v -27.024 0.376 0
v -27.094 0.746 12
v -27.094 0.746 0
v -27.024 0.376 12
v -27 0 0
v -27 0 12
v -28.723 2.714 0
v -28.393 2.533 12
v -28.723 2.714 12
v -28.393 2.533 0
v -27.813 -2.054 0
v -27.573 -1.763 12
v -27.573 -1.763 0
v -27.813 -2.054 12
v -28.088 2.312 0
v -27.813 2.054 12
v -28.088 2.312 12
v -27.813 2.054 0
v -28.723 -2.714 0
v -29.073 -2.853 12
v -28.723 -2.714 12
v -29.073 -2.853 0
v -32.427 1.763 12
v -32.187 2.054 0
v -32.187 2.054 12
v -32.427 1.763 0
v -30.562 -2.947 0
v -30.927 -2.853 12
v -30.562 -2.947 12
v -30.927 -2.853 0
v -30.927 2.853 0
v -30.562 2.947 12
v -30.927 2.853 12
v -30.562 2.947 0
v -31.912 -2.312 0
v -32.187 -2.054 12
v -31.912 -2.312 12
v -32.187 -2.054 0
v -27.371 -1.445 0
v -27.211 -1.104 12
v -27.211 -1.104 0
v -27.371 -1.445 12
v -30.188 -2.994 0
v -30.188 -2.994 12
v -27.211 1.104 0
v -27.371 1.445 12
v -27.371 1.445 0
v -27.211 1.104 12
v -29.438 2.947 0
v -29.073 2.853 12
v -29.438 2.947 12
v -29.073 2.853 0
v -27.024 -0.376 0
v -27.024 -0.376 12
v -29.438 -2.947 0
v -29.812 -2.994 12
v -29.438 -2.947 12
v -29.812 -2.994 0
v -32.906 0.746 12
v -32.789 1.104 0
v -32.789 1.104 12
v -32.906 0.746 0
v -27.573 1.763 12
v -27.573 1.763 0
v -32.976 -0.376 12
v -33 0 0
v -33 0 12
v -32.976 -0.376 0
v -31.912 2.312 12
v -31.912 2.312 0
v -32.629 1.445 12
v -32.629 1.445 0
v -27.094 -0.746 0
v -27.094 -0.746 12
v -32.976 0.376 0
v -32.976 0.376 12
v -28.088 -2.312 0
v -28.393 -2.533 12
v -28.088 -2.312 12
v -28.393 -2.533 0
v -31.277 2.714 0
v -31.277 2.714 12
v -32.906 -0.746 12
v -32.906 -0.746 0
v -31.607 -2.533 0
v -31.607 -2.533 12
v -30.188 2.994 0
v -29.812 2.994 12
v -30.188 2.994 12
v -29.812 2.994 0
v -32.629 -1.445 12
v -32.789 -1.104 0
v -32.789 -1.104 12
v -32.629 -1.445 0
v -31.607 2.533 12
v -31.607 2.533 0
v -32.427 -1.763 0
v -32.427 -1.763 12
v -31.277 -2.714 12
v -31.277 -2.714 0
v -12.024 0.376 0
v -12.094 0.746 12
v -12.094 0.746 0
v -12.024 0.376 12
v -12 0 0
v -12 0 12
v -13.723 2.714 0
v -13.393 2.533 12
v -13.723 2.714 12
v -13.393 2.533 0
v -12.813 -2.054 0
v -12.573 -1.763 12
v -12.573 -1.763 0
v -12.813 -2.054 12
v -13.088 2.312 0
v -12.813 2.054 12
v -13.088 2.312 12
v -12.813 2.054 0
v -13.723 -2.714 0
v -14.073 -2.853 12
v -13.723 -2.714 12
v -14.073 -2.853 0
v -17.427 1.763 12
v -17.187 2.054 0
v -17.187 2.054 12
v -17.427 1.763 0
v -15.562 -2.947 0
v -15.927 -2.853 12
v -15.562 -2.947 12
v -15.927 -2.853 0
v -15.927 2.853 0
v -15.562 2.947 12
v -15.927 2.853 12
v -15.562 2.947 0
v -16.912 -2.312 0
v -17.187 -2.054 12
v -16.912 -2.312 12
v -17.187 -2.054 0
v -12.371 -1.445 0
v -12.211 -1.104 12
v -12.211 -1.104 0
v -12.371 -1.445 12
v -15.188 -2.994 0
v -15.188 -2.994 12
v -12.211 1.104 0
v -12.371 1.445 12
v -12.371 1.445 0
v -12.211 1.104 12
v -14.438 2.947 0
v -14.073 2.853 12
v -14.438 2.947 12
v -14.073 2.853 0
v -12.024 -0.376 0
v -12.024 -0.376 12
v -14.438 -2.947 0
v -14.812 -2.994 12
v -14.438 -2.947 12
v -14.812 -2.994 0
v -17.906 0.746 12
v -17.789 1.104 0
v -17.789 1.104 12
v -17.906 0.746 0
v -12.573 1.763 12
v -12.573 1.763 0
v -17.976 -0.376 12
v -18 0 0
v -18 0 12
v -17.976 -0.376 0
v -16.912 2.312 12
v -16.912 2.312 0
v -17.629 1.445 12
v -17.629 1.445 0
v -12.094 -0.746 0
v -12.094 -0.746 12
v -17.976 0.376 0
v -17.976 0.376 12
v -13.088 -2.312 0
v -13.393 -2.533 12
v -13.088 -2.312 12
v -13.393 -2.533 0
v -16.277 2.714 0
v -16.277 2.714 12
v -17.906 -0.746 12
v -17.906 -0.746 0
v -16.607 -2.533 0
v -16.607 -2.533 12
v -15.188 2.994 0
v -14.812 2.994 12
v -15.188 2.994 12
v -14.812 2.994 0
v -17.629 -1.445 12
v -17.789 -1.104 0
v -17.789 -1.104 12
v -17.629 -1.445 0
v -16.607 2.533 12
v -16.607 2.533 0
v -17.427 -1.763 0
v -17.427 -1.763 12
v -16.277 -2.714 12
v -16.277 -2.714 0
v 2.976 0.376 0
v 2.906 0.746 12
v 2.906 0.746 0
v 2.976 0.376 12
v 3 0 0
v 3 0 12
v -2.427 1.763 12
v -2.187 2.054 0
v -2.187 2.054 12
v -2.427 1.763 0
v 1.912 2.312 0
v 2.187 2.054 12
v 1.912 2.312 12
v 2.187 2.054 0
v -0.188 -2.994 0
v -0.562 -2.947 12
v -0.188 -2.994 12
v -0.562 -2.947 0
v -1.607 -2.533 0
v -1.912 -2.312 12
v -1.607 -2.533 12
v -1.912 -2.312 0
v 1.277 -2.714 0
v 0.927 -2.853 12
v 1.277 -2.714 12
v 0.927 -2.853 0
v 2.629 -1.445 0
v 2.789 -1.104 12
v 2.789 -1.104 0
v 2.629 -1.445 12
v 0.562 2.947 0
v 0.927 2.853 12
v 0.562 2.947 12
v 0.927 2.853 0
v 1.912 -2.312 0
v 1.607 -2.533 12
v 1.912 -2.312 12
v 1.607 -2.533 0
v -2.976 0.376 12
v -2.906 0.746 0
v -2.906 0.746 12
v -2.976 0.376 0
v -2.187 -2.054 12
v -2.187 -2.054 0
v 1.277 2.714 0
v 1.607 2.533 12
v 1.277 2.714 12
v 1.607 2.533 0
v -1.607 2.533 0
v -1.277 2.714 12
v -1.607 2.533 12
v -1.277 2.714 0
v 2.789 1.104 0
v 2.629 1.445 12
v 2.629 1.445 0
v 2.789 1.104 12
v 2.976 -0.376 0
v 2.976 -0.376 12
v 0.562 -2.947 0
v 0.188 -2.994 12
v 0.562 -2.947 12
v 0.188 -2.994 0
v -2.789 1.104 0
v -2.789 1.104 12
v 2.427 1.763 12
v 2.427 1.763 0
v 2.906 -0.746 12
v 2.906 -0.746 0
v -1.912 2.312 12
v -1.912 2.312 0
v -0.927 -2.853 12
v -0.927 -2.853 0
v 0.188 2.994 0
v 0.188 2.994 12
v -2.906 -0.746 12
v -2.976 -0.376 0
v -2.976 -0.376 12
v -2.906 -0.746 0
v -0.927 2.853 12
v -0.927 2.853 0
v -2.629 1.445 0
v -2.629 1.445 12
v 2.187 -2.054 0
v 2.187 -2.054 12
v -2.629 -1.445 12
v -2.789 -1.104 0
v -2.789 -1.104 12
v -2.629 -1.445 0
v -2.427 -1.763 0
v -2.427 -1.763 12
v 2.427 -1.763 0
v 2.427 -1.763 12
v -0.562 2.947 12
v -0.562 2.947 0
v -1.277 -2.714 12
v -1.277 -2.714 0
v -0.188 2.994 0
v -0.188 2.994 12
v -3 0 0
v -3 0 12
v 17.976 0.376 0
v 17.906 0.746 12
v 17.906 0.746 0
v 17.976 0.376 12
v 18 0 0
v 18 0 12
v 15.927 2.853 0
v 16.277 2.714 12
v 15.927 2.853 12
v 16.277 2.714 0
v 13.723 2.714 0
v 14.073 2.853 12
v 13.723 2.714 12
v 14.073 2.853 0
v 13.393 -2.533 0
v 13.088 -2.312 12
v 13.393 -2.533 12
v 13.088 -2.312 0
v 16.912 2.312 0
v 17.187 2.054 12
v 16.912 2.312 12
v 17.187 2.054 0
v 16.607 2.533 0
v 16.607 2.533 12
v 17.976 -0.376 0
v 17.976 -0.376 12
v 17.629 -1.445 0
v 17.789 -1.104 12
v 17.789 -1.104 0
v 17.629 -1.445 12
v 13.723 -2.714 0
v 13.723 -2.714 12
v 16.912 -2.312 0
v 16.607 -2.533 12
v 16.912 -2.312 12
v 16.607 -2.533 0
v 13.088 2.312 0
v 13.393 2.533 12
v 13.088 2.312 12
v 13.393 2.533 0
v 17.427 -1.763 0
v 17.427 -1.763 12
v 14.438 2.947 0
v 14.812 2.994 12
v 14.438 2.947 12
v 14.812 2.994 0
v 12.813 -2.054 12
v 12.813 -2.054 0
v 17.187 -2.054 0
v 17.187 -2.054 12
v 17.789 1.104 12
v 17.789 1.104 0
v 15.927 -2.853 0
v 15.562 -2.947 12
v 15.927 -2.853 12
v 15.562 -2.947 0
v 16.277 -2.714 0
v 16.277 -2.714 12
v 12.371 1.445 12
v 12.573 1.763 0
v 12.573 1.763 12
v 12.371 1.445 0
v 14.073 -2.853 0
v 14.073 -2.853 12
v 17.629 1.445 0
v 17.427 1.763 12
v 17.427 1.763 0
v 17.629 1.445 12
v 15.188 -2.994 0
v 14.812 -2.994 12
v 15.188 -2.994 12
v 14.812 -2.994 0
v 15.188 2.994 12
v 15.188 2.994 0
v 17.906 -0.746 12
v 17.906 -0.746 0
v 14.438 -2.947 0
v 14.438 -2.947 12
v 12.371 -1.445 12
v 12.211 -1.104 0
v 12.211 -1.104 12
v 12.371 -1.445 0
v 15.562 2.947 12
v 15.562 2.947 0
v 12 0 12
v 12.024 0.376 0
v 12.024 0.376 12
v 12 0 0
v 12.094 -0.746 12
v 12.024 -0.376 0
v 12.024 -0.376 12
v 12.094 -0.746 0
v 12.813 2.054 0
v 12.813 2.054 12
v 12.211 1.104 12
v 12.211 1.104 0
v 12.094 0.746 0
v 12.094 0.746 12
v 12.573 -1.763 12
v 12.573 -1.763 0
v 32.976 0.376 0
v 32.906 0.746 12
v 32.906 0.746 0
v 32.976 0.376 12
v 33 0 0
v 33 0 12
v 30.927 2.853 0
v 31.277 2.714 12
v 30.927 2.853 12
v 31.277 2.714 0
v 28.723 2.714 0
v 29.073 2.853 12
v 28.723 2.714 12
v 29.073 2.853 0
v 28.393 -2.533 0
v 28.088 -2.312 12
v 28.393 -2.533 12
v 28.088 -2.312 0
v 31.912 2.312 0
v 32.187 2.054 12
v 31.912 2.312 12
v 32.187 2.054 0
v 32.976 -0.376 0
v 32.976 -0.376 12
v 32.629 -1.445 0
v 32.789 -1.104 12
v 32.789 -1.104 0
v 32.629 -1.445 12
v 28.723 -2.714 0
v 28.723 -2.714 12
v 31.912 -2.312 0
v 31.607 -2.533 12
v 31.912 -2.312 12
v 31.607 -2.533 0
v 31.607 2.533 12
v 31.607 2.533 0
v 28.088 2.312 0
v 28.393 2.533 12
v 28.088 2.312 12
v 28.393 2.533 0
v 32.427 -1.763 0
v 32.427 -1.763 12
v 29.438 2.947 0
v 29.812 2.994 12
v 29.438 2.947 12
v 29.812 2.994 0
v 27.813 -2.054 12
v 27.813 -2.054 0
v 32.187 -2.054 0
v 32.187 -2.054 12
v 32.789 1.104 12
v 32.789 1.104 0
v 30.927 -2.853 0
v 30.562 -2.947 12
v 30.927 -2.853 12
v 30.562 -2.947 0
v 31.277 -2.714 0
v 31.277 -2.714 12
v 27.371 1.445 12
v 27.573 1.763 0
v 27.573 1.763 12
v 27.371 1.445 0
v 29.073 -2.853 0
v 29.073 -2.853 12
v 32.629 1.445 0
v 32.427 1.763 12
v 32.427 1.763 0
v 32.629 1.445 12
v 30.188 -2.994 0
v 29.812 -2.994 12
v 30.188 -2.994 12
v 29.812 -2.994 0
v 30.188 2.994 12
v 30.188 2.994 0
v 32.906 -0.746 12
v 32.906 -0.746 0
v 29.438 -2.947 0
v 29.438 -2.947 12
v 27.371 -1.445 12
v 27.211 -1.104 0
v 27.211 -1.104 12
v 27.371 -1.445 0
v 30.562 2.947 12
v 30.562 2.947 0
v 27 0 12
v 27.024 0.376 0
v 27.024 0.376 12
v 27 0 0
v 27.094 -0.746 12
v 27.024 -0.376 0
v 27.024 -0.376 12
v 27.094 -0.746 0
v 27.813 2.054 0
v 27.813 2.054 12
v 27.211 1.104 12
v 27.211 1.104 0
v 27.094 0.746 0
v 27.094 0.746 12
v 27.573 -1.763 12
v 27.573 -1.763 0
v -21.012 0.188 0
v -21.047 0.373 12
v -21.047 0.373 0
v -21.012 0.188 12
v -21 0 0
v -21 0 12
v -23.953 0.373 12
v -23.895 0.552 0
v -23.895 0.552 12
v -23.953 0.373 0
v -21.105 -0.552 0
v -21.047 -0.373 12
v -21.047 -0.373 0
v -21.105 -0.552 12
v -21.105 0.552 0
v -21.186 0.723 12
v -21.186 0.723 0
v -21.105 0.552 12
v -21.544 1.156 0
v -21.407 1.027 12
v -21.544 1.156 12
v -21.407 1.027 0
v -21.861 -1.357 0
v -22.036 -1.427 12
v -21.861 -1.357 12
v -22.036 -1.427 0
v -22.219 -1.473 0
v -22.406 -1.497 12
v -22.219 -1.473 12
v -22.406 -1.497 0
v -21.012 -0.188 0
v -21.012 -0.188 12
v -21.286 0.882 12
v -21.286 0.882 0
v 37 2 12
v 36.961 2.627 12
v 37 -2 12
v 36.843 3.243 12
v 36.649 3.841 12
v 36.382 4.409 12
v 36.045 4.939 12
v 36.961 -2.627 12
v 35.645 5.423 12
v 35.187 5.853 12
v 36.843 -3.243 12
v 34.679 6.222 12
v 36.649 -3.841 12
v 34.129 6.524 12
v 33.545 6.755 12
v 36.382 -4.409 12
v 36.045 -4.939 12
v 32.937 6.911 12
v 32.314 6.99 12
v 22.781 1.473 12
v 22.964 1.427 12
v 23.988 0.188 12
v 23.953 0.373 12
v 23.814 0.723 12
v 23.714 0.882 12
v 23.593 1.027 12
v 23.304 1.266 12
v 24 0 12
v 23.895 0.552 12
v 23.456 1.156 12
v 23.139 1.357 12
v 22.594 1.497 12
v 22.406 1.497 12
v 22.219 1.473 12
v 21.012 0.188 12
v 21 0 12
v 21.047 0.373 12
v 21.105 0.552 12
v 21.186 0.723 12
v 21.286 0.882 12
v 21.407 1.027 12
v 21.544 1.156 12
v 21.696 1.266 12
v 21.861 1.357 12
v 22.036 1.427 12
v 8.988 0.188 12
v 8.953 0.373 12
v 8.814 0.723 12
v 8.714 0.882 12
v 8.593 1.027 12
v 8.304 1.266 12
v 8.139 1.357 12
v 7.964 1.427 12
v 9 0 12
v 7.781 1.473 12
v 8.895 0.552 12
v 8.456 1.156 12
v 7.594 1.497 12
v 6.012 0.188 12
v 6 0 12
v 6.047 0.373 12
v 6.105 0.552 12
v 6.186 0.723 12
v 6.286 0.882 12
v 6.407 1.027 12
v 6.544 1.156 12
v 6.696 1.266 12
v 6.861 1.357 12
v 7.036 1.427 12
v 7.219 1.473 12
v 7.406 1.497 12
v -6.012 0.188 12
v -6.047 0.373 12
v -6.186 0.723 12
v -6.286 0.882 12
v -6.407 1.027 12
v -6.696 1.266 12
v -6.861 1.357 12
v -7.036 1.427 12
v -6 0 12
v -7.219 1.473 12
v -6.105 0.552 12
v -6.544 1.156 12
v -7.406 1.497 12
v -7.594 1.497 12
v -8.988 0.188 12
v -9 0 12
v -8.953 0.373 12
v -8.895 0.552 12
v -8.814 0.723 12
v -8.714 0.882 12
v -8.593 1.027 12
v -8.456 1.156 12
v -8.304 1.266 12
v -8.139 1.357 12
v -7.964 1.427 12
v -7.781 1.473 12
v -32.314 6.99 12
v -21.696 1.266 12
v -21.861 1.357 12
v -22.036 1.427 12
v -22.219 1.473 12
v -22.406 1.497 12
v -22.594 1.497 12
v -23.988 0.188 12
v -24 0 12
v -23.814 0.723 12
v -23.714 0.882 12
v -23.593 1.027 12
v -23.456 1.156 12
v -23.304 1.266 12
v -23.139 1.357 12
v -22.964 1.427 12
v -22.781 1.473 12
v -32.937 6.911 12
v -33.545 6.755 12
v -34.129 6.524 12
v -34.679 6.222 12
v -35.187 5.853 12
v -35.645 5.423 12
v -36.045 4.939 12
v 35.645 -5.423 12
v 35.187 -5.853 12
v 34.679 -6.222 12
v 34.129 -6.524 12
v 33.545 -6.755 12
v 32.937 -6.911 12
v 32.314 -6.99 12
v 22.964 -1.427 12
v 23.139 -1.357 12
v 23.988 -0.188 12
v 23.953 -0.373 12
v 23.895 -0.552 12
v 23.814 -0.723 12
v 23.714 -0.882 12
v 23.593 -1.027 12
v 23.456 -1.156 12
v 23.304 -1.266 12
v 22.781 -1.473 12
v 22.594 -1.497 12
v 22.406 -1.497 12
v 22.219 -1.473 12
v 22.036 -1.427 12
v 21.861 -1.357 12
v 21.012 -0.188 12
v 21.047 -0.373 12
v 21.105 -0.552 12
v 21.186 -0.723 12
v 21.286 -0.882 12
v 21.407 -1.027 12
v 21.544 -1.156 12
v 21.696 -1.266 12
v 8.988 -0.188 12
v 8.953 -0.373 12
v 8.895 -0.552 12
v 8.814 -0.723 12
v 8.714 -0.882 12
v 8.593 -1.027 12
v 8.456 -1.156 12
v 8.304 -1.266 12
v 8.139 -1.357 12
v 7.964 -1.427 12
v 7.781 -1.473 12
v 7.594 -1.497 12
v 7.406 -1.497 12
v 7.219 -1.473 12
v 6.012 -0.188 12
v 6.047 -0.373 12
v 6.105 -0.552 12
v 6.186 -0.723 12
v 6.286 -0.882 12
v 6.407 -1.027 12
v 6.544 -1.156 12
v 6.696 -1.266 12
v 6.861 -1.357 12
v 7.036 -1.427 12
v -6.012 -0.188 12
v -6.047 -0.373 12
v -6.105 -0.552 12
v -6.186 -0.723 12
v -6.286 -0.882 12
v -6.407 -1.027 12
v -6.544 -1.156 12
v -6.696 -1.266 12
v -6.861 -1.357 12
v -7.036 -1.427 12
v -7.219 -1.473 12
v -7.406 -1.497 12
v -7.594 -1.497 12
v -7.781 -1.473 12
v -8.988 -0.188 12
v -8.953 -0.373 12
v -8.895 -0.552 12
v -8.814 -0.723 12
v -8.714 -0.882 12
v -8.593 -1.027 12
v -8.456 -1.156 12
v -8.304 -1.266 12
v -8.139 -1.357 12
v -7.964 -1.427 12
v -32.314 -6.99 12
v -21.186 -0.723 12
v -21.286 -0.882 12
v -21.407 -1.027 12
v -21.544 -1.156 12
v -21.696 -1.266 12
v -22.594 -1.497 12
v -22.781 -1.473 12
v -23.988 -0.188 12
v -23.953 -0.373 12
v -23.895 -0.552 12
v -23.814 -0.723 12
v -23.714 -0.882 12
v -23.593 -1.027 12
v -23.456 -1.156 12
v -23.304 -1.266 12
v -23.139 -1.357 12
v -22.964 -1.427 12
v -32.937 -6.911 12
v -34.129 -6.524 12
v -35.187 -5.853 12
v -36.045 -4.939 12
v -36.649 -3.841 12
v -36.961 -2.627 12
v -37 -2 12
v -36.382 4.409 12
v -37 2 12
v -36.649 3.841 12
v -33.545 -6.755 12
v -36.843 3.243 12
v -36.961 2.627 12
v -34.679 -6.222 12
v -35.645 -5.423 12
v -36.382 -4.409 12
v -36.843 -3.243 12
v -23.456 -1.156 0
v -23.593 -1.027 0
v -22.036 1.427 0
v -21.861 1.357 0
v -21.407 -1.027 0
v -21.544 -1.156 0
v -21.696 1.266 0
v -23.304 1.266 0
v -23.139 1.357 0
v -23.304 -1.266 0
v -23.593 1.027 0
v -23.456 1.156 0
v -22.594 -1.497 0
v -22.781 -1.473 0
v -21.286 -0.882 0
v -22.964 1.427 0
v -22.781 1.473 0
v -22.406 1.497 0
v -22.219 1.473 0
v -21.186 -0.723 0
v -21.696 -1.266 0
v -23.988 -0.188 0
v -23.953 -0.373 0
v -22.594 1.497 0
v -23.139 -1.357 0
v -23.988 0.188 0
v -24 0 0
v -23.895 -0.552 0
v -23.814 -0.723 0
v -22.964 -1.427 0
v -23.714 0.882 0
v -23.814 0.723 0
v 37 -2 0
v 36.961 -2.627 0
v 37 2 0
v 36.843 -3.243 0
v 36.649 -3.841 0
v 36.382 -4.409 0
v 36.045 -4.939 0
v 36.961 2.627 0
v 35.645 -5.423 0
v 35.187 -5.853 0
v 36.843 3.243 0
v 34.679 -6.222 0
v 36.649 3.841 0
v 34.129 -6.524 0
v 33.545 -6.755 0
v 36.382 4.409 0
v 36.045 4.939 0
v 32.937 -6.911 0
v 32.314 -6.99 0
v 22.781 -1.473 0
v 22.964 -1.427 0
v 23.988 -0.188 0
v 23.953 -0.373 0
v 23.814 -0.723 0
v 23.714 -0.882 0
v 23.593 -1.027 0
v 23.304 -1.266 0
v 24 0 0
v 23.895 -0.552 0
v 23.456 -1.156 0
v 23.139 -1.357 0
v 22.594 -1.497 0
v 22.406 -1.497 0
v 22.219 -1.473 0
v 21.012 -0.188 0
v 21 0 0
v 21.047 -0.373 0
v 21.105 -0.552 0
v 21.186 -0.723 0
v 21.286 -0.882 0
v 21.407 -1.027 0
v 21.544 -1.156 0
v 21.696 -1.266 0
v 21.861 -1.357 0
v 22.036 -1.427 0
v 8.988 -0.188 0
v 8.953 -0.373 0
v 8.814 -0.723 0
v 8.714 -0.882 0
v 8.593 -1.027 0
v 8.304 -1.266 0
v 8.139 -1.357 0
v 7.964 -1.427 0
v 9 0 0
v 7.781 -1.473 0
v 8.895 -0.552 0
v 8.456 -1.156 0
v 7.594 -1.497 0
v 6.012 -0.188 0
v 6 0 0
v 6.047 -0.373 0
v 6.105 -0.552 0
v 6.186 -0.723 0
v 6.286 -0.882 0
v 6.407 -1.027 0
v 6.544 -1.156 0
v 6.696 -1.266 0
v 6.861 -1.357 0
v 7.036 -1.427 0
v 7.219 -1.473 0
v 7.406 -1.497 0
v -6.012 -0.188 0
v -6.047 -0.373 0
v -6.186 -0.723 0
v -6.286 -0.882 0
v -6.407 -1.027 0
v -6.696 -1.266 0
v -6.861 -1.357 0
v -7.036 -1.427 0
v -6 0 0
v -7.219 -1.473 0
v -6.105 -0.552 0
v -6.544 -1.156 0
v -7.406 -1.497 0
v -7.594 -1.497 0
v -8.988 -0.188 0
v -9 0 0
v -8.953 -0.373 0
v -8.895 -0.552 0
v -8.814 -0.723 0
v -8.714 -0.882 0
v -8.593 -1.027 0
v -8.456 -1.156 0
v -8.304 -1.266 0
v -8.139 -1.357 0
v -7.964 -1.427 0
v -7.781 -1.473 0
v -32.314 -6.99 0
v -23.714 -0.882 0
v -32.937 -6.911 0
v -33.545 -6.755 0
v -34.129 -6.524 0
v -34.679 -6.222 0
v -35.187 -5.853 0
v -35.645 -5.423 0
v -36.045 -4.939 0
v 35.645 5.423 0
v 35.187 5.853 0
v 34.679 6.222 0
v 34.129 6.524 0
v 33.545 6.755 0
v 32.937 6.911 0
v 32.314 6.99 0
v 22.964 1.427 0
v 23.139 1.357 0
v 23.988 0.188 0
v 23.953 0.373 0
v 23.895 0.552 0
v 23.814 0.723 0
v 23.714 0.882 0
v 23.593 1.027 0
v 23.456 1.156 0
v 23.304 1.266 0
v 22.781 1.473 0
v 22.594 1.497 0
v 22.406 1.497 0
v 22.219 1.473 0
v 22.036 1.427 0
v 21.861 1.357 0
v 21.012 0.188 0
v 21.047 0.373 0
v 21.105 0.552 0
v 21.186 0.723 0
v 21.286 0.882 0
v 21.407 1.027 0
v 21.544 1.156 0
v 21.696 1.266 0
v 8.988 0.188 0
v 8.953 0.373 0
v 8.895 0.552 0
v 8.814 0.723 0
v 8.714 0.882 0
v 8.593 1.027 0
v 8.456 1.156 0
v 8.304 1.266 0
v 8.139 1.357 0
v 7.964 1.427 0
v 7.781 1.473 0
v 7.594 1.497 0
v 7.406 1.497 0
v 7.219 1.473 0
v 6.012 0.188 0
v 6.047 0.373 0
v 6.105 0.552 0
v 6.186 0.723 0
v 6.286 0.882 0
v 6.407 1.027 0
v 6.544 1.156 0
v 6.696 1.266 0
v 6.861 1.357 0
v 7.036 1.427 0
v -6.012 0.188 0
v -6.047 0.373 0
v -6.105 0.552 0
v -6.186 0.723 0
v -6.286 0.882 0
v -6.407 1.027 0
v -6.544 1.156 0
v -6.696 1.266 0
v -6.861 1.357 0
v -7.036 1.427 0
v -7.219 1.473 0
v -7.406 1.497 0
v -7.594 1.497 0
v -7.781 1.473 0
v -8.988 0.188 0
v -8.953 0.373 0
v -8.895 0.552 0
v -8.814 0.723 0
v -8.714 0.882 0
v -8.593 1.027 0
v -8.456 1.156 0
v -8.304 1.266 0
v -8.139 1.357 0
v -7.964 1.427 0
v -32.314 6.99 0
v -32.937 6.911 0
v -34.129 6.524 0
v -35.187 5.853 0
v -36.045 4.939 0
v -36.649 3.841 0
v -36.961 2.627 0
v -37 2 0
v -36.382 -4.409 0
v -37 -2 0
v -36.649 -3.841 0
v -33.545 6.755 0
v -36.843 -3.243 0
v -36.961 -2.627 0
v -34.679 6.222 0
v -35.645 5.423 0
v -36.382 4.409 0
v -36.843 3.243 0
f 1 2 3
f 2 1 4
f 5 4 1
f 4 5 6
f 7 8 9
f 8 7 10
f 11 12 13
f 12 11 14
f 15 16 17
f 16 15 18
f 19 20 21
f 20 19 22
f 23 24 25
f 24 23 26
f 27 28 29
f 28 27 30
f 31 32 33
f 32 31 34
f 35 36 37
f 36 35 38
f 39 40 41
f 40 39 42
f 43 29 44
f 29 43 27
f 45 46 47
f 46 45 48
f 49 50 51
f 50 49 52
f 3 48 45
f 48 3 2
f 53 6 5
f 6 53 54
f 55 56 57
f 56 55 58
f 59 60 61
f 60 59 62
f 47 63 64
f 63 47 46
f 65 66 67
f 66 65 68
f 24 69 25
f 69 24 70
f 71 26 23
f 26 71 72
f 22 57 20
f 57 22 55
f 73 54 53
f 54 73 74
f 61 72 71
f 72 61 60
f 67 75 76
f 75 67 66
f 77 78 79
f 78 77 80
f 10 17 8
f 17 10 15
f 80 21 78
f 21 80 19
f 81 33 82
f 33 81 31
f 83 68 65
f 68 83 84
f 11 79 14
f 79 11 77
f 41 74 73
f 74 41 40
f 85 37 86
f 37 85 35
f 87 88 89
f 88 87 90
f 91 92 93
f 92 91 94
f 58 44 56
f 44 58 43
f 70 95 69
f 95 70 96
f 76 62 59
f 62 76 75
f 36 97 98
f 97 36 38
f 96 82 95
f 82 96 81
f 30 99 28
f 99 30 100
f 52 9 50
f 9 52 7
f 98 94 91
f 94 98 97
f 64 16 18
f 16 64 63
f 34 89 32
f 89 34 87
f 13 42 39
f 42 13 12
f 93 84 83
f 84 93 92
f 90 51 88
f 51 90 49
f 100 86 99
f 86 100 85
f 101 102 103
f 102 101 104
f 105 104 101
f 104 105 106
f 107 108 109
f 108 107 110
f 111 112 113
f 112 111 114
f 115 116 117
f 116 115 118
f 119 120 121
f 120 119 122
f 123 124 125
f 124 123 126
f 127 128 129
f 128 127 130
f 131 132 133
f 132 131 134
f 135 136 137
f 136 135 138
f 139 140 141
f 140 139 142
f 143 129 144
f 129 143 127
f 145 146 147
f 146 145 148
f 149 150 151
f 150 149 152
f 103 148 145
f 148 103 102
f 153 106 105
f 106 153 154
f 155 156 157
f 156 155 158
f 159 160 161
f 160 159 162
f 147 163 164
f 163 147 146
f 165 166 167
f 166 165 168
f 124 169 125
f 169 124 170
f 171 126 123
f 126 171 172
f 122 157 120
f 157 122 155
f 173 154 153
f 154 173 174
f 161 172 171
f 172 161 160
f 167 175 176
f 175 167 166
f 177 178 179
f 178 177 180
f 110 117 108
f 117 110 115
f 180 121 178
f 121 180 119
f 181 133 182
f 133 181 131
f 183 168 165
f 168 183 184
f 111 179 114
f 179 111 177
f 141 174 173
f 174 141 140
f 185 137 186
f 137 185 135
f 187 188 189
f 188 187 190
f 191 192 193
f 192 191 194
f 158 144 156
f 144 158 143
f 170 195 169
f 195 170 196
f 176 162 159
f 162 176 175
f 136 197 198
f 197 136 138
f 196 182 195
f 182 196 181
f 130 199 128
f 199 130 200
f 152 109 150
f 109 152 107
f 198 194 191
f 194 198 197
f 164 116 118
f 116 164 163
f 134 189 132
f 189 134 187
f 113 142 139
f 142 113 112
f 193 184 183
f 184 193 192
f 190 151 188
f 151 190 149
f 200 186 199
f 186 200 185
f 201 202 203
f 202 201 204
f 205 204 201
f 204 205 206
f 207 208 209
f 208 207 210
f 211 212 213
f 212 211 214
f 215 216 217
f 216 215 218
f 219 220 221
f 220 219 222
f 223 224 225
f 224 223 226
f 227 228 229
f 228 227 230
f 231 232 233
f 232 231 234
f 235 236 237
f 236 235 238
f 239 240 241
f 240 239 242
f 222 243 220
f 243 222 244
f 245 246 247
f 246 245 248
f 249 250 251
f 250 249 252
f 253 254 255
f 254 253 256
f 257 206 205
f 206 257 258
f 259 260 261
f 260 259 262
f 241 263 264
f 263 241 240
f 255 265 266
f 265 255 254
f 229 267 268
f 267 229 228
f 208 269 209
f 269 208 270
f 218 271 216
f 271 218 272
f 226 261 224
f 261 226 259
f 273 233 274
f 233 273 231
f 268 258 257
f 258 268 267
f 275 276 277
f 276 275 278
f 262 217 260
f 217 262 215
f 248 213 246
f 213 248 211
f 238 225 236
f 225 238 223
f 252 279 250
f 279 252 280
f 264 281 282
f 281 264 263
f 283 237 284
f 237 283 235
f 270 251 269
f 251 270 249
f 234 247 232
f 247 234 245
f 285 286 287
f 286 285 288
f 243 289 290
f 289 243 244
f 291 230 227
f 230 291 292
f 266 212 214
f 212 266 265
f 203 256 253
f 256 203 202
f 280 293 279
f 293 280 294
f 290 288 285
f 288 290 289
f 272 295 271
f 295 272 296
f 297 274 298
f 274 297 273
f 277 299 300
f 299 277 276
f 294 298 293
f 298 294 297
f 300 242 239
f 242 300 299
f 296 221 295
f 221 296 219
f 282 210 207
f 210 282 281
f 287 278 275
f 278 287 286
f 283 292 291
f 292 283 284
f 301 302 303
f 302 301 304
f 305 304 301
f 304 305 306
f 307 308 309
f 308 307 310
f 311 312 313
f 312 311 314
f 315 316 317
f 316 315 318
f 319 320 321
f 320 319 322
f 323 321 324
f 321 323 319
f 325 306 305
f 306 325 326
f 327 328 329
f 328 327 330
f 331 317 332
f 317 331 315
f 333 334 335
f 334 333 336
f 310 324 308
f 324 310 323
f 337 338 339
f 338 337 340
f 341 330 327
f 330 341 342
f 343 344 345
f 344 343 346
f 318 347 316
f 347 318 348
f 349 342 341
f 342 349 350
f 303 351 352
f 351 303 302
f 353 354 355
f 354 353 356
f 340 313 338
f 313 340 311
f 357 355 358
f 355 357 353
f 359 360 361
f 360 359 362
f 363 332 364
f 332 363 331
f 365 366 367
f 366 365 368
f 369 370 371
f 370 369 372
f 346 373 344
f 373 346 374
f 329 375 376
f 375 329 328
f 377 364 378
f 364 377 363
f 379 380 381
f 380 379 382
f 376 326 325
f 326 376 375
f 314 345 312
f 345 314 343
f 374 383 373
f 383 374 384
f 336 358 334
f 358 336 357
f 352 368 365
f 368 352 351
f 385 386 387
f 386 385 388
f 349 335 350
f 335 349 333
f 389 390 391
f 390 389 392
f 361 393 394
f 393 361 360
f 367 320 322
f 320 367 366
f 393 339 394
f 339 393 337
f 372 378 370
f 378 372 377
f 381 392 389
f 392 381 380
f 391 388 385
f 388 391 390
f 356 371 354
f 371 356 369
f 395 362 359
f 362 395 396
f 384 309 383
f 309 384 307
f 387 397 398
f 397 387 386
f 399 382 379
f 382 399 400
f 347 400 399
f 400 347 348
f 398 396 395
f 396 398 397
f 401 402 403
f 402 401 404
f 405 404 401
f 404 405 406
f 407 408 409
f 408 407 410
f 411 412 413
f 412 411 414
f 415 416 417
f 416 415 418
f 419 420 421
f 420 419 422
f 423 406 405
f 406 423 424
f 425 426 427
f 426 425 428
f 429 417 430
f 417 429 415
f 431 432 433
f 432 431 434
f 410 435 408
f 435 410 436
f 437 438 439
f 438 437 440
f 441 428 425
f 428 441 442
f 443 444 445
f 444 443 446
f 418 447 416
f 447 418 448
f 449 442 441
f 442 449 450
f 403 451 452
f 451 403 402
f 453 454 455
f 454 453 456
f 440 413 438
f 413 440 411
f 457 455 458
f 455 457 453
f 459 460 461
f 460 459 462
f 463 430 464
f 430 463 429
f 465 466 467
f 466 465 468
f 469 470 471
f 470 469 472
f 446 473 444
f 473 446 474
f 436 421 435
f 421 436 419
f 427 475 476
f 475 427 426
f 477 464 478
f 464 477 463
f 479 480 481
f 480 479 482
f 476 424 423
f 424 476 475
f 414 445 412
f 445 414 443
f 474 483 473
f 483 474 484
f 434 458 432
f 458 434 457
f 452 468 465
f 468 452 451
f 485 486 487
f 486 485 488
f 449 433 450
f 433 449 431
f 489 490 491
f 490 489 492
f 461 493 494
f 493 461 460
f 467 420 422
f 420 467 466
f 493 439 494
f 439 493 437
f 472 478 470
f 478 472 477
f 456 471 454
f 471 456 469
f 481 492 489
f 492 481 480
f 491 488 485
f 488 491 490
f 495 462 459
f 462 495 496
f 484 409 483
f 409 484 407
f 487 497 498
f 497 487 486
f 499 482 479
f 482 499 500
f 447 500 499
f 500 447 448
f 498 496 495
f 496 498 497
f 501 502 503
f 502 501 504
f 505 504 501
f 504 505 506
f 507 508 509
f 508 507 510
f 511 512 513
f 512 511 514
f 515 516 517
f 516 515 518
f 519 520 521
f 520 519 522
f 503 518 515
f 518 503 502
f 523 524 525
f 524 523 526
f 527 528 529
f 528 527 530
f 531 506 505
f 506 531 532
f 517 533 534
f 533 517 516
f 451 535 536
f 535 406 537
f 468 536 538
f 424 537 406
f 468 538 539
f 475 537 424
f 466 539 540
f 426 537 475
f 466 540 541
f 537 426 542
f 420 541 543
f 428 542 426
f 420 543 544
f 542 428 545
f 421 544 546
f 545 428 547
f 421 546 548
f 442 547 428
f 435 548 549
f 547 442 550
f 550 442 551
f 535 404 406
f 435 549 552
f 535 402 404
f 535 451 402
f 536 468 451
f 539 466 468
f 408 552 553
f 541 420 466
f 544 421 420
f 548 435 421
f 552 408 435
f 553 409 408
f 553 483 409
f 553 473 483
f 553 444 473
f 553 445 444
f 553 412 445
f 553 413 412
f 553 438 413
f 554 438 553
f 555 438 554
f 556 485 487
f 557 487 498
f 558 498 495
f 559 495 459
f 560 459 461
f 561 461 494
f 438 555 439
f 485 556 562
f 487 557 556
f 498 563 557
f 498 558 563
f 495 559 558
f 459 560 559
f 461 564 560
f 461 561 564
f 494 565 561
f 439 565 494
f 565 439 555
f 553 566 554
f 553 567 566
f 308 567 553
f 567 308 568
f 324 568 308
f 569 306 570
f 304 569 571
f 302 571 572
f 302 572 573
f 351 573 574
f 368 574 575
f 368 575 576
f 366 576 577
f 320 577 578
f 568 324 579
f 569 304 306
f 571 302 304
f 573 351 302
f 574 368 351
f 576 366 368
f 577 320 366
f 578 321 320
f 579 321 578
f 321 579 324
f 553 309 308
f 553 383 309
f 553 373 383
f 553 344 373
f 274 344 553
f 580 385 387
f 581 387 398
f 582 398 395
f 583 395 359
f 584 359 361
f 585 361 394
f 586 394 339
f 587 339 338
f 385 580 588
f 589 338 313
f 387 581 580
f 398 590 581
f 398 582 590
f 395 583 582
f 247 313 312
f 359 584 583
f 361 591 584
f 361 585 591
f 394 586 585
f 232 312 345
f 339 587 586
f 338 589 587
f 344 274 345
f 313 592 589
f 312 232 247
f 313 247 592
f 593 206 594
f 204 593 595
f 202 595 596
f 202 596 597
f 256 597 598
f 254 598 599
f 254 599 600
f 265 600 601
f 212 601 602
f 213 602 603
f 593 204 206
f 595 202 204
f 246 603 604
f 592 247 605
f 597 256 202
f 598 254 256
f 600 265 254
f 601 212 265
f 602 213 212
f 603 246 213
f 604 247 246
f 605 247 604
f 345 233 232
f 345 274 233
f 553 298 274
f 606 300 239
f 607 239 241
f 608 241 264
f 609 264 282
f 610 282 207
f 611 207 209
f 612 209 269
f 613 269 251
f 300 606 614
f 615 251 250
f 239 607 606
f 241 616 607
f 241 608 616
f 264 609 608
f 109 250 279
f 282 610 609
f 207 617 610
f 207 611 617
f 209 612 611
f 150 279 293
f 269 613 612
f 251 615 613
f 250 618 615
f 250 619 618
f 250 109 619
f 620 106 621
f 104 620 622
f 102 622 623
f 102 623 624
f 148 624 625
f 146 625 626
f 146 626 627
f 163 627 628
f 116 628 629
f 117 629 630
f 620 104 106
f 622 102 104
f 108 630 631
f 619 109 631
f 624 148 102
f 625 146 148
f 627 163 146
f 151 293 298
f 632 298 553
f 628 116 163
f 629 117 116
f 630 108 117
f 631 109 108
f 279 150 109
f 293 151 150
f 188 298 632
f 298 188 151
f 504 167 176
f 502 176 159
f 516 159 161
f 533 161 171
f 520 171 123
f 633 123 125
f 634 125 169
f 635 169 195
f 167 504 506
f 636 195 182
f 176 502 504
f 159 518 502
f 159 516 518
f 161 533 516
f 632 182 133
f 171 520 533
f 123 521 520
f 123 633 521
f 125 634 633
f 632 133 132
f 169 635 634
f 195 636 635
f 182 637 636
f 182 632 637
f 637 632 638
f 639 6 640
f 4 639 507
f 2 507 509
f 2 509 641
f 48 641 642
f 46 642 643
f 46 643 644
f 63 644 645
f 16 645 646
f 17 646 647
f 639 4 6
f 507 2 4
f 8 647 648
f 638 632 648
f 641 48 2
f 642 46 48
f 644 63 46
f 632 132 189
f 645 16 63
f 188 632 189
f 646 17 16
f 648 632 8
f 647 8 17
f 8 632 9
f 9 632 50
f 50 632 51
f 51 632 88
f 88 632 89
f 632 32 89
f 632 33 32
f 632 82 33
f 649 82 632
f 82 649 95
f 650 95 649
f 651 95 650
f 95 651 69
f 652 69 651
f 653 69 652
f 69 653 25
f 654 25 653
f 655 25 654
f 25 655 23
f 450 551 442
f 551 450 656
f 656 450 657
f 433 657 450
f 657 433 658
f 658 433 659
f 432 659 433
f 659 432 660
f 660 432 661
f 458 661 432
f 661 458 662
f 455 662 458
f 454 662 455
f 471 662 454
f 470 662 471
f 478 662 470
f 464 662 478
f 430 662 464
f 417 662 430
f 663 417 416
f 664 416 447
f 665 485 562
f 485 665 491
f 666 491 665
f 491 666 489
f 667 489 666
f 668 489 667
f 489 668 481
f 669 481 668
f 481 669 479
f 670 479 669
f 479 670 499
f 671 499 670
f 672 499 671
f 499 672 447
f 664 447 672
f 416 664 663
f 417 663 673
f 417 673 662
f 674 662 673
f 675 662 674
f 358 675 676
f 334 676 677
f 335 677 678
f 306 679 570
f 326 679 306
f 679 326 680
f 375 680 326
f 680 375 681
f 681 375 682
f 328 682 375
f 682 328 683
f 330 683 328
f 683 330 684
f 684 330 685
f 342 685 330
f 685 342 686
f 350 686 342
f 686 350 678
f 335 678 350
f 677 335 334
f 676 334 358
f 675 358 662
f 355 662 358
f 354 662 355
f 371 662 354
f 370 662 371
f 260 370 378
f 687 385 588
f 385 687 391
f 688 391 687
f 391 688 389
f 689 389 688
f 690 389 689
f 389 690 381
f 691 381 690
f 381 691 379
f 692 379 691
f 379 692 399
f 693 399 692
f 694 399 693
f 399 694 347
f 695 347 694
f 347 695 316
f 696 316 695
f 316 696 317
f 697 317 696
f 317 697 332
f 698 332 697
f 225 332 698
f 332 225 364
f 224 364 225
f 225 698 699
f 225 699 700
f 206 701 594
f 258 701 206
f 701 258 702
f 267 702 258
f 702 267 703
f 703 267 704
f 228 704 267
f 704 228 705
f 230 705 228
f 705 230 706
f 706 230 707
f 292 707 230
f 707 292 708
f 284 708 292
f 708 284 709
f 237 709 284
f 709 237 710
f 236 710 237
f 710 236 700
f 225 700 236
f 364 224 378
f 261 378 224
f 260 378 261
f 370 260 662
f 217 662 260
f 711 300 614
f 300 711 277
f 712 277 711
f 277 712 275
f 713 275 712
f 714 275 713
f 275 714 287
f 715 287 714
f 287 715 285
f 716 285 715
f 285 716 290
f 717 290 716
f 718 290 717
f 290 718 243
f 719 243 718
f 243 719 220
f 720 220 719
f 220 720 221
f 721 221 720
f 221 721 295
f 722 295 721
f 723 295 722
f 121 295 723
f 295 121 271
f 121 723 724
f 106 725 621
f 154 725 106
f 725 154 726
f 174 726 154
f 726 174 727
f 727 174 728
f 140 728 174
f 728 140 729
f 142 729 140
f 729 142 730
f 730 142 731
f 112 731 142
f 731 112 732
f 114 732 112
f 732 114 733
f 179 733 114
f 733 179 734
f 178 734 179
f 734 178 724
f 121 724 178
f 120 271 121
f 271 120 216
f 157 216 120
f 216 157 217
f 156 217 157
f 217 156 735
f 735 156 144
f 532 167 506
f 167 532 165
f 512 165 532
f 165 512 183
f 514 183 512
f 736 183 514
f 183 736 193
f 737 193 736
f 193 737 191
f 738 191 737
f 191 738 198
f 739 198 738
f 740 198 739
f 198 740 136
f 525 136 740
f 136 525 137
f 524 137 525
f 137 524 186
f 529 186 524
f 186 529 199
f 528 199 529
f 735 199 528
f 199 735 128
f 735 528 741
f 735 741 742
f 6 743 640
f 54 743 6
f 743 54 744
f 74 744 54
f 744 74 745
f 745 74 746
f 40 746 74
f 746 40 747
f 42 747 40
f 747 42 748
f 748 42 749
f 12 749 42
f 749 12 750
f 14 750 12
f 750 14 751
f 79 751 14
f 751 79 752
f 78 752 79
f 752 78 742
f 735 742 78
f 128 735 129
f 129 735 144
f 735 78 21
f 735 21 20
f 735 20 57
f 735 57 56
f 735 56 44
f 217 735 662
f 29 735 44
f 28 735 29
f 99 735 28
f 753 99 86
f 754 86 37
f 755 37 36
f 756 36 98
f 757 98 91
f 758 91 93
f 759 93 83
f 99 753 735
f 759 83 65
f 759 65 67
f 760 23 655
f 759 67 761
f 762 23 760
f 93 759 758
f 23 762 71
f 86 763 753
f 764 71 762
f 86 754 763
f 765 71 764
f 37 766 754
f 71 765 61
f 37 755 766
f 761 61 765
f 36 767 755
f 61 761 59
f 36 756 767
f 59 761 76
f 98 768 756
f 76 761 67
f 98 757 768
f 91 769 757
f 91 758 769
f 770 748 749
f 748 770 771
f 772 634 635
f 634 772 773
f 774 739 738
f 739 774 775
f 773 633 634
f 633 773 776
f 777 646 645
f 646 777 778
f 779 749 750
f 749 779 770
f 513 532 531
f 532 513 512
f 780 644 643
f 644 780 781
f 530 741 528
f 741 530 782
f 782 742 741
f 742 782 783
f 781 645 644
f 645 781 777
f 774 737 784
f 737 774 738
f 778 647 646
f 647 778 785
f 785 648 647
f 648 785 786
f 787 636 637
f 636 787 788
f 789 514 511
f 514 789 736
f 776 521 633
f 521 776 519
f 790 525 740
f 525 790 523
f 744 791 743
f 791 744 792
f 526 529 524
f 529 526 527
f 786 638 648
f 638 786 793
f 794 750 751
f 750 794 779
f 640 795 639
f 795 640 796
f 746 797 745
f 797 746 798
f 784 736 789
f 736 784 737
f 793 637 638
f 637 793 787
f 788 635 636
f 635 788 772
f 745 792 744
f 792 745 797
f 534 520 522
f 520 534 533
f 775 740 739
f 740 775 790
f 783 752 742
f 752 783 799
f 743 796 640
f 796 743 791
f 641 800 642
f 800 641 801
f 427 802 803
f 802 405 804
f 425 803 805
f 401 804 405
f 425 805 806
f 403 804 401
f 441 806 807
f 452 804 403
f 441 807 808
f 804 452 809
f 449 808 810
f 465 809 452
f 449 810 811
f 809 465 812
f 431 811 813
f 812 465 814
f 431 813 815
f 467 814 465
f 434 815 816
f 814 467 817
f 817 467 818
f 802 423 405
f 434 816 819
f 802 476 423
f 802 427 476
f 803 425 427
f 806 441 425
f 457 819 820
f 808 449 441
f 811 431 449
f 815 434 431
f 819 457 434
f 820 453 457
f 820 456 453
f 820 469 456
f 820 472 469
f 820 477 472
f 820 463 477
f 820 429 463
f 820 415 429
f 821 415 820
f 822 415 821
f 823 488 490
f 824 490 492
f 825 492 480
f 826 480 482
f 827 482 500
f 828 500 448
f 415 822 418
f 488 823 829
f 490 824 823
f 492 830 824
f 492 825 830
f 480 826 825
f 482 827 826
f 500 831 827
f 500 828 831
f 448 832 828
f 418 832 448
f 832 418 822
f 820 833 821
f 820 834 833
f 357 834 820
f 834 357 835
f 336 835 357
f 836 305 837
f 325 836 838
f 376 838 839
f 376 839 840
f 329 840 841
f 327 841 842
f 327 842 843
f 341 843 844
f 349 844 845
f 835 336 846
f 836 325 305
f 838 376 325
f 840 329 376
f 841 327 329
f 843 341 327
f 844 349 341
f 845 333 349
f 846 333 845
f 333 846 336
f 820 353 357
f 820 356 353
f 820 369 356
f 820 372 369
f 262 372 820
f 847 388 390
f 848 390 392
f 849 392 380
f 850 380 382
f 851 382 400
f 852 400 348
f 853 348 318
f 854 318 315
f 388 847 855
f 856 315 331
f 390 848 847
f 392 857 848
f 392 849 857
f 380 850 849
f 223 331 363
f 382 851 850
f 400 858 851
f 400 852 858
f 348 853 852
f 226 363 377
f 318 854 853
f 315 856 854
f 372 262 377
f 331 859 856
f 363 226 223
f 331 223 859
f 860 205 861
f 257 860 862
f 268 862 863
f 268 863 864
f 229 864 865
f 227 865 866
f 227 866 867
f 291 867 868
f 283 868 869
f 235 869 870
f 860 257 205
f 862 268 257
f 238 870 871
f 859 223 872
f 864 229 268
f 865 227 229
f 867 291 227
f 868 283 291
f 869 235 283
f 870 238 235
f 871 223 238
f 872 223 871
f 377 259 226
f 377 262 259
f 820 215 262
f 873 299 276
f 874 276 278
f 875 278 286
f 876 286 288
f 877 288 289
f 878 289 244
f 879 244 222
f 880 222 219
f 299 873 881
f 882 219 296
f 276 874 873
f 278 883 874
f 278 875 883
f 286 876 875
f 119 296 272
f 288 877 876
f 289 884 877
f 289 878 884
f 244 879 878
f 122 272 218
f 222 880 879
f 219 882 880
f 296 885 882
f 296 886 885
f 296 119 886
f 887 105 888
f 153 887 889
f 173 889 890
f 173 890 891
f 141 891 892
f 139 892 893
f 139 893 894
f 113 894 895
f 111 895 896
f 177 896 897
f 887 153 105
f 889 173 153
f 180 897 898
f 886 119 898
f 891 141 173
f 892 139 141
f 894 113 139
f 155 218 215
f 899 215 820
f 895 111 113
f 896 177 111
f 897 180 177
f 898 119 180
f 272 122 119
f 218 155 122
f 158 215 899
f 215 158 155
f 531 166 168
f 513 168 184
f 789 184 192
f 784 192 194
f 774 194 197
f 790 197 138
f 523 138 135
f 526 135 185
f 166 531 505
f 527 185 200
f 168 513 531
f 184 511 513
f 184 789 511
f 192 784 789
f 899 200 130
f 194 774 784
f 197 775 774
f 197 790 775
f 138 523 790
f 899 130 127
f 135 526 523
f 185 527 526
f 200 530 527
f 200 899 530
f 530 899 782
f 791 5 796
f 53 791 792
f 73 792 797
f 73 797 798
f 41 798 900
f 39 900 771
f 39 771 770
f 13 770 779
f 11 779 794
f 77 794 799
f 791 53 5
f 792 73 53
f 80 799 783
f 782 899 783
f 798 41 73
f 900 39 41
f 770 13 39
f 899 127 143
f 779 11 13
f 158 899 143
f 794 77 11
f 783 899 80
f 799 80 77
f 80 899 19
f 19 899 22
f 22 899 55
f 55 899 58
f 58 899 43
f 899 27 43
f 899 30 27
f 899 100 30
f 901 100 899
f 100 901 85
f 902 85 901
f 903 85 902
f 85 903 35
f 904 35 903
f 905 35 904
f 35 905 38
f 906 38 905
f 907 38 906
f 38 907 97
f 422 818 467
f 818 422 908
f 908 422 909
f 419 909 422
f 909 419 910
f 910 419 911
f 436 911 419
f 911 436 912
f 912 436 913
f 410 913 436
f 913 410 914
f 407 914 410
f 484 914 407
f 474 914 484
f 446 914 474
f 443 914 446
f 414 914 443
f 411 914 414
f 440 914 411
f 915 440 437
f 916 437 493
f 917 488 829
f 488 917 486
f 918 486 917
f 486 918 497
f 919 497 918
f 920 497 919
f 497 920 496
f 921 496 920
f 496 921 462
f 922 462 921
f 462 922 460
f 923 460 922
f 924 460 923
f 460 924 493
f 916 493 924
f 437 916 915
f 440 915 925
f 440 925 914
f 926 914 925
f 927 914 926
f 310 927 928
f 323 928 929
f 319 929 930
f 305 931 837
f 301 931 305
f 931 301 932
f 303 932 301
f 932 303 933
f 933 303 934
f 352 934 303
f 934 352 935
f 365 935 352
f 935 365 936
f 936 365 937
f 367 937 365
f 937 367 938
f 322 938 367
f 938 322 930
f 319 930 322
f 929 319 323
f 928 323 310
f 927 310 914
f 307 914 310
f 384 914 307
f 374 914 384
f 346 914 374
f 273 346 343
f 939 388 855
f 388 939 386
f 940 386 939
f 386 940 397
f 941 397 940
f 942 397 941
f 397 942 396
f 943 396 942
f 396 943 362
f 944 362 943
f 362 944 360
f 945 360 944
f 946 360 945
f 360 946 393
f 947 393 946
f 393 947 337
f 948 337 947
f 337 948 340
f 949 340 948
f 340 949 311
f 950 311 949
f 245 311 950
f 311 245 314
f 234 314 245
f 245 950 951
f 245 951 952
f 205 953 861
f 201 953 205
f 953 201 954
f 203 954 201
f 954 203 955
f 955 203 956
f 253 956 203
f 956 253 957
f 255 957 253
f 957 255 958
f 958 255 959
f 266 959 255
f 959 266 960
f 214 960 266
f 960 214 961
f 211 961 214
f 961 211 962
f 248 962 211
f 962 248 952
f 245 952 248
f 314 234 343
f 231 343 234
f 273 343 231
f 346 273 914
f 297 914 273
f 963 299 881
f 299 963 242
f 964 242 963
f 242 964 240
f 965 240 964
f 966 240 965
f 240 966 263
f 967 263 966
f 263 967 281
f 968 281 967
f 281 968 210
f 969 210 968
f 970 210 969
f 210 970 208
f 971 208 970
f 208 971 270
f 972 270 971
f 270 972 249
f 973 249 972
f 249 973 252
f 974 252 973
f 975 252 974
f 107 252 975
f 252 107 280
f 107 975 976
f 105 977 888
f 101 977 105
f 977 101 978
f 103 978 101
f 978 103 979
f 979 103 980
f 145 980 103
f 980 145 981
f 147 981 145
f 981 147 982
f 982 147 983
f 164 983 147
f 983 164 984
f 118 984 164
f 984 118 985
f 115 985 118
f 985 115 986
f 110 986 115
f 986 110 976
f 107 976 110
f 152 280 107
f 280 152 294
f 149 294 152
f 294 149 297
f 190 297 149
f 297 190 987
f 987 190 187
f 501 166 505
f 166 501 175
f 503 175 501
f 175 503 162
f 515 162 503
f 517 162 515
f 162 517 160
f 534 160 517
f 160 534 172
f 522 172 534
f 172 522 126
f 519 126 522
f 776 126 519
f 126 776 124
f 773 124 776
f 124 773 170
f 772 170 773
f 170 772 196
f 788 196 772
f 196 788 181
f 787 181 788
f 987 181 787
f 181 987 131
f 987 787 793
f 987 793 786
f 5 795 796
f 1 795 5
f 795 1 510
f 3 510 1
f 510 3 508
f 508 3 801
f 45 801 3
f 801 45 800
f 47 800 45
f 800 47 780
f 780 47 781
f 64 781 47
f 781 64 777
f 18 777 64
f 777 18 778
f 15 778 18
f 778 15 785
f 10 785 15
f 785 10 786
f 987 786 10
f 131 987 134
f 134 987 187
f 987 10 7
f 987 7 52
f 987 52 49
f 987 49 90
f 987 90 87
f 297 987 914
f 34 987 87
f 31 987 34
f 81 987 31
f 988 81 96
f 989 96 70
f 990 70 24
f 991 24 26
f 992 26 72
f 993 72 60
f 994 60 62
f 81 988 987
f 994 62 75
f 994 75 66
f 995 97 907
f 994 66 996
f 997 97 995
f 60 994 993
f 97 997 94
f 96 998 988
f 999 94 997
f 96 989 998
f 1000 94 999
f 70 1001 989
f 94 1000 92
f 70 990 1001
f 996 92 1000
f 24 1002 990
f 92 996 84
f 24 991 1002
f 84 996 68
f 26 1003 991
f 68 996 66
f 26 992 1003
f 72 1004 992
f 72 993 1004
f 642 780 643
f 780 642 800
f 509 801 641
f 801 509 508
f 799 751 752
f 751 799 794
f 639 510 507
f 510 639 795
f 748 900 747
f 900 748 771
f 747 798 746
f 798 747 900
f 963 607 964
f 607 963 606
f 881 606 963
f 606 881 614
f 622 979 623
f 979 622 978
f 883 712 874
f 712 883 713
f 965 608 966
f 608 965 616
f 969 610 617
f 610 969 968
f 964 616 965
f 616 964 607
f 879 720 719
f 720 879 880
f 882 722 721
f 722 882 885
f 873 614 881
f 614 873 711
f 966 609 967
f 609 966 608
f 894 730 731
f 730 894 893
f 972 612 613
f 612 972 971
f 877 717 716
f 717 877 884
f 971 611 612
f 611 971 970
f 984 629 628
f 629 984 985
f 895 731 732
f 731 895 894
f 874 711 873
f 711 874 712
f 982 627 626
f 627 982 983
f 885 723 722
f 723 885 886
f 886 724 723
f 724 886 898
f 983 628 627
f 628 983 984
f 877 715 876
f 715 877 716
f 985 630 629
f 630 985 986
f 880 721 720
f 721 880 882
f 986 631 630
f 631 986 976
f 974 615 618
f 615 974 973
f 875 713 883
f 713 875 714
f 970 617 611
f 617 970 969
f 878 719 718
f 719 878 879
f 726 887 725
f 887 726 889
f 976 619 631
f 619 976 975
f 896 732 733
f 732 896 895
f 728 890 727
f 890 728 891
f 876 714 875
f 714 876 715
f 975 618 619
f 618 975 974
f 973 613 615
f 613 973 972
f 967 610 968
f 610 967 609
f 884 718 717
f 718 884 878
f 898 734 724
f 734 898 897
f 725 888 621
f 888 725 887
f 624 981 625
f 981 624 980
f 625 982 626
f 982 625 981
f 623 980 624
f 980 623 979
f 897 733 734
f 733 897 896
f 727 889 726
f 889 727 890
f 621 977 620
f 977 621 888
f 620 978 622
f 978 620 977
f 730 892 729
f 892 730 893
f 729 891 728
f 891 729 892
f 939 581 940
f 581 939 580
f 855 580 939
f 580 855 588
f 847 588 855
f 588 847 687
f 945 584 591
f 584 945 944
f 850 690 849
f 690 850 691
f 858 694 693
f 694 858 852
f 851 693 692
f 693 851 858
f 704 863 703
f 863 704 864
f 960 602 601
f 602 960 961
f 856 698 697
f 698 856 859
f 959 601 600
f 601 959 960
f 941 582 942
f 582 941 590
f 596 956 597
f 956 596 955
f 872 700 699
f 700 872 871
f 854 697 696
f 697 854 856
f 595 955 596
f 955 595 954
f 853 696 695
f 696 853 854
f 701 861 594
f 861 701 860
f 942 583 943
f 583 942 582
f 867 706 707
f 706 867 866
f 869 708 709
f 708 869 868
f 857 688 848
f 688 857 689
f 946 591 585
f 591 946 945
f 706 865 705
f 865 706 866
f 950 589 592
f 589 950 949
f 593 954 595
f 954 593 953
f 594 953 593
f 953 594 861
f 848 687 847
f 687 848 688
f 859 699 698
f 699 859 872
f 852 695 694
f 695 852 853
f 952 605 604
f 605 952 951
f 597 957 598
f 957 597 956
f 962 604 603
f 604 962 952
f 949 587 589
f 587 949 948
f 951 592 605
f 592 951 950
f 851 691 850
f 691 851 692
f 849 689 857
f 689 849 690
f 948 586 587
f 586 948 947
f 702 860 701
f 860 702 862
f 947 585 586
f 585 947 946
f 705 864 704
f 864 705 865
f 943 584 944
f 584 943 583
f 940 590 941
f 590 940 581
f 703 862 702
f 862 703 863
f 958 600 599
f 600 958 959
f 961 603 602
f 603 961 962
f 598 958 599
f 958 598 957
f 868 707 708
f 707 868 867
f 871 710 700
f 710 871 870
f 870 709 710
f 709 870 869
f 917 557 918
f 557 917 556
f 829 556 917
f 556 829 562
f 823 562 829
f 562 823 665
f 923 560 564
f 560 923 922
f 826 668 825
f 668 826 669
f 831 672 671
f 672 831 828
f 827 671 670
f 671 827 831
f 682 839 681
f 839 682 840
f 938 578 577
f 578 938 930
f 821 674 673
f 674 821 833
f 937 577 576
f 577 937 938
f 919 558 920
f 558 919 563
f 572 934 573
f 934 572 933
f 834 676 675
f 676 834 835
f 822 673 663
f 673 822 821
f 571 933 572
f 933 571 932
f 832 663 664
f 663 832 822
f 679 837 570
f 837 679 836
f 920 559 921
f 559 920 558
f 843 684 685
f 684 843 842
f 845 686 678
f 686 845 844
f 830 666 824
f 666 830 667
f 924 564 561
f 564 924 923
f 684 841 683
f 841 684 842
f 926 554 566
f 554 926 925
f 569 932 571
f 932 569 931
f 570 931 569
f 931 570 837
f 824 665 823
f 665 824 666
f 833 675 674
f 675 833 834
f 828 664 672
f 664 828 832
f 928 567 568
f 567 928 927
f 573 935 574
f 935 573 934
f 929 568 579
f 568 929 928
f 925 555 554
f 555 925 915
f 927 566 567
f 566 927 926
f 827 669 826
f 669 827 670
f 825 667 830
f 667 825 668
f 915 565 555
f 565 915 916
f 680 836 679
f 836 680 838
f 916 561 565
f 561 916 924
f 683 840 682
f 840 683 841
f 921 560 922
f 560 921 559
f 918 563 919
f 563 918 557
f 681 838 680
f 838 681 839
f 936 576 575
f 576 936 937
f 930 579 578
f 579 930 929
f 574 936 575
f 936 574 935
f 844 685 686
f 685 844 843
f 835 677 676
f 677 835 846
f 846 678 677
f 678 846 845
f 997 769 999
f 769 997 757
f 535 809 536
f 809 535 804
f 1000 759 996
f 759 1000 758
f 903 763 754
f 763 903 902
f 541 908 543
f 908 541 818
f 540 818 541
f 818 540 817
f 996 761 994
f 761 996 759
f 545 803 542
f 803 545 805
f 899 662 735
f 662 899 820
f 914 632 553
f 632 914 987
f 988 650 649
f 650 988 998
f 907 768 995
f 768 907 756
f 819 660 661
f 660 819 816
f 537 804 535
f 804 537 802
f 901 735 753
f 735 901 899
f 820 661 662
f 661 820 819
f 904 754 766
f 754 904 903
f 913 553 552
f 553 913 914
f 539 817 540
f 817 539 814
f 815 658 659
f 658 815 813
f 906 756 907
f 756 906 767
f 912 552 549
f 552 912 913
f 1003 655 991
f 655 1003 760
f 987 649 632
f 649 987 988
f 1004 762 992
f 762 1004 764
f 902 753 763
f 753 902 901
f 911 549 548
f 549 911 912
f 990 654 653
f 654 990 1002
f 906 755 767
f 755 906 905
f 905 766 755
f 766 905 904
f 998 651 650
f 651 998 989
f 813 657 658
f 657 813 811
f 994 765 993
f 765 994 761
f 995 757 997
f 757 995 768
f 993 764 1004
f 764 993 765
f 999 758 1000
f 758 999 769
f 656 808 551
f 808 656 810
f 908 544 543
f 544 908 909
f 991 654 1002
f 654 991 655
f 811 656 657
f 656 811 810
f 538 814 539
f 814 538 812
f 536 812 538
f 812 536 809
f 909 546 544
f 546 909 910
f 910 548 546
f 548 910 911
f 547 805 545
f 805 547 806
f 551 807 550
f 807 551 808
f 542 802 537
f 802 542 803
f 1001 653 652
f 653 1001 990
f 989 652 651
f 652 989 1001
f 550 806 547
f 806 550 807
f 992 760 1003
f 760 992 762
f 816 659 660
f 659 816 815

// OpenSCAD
$fn = 50;


difference() {
	union() {
		hull() {
			translate(v = [-32.0000000000, 2.0000000000, 0]) {
				cylinder(h = 12, r = 5);
			}
			translate(v = [32.0000000000, 2.0000000000, 0]) {
				cylinder(h = 12, r = 5);
			}
			translate(v = [-32.0000000000, -2.0000000000, 0]) {
				cylinder(h = 12, r = 5);
			}
			translate(v = [32.0000000000, -2.0000000000, 0]) {
				cylinder(h = 12, r = 5);
			}
		}
	}
	union() {
		translate(v = [-30.0000000000, 0.0000000000, -100.0000000000]) {
			cylinder(h = 200, r = 3.0000000000);
		}
		translate(v = [-15.0000000000, 0.0000000000, -100.0000000000]) {
			cylinder(h = 200, r = 3.0000000000);
		}
		translate(v = [0.0000000000, 0.0000000000, -100.0000000000]) {
			cylinder(h = 200, r = 3.0000000000);
		}
		translate(v = [15.0000000000, 0.0000000000, -100.0000000000]) {
			cylinder(h = 200, r = 3.0000000000);
		}
		translate(v = [30.0000000000, 0.0000000000, -100.0000000000]) {
			cylinder(h = 200, r = 3.0000000000);
		}
		translate(v = [-30.0000000000, 0.0000000000, 0]) {
			cylinder(h = 12, r = 1.5000000000);
		}
		translate(v = [-22.5000000000, 0.0000000000, 0]) {
			cylinder(h = 12, r = 1.5000000000);
		}
		translate(v = [-15.0000000000, 0.0000000000, 0]) {
			cylinder(h = 12, r = 1.5000000000);
		}
		translate(v = [-7.5000000000, 0.0000000000, 0]) {
			cylinder(h = 12, r = 1.5000000000);
		}
		cylinder(h = 12, r = 1.5000000000);
		translate(v = [7.5000000000, 0.0000000000, 0]) {
			cylinder(h = 12, r = 1.5000000000);
		}
		translate(v = [15.0000000000, 0.0000000000, 0]) {
			cylinder(h = 12, r = 1.5000000000);
		}
		translate(v = [22.5000000000, 0.0000000000, 0]) {
			cylinder(h = 12, r = 1.5000000000);
		}
		translate(v = [30.0000000000, 0.0000000000, 0]) {
			cylinder(h = 12, r = 1.5000000000);
		}
		translate(v = [-30.0000000000, 0.0000000000, 0]) {
			cylinder(h = 12, r = 1.5000000000);
		}
		translate(v = [-22.5000000000, 0.0000000000, 0]) {
			cylinder(h = 12, r = 1.5000000000);
		}
		translate(v = [-15.0000000000, 0.0000000000, 0]) {
			cylinder(h = 12, r = 1.5000000000);
		}
		translate(v = [-7.5000000000, 0.0000000000, 0]) {
			cylinder(h = 12, r = 1.5000000000);
		}
		cylinder(h = 12, r = 1.5000000000);
		translate(v = [7.5000000000, 0.0000000000, 0]) {
			cylinder(h = 12, r = 1.5000000000);
		}
		translate(v = [15.0000000000, 0.0000000000, 0]) {
			cylinder(h = 12, r = 1.5000000000);
		}
		translate(v = [22.5000000000, 0.0000000000, 0]) {
			cylinder(h = 12, r = 1.5000000000);
		}
		translate(v = [30.0000000000, 0.0000000000, 0]) {
			cylinder(h = 12, r = 1.5000000000);
		}
		translate(v = [-30.0000000000, 0.0000000000, 0]) {
			cylinder(h = 12, r = 1.5000000000);
		}
		translate(v = [-22.5000000000, 0.0000000000, 0]) {
			cylinder(h = 12, r = 1.5000000000);
		}
		translate(v = [-15.0000000000, 0.0000000000, 0]) {
			cylinder(h = 12, r = 1.5000000000);
		}
		translate(v = [-7.5000000000, 0.0000000000, 0]) {
			cylinder(h = 12, r = 1.5000000000);
		}
		cylinder(h = 12, r = 1.5000000000);
		translate(v = [7.5000000000, 0.0000000000, 0]) {
			cylinder(h = 12, r = 1.5000000000);
		}
		translate(v = [15.0000000000, 0.0000000000, 0]) {
			cylinder(h = 12, r = 1.5000000000);
		}
		translate(v = [22.5000000000, 0.0000000000, 0]) {
			cylinder(h = 12, r = 1.5000000000);
		}
		translate(v = [30.0000000000, 0.0000000000, 0]) {
			cylinder(h = 12, r = 1.5000000000);
		}
	}
}
